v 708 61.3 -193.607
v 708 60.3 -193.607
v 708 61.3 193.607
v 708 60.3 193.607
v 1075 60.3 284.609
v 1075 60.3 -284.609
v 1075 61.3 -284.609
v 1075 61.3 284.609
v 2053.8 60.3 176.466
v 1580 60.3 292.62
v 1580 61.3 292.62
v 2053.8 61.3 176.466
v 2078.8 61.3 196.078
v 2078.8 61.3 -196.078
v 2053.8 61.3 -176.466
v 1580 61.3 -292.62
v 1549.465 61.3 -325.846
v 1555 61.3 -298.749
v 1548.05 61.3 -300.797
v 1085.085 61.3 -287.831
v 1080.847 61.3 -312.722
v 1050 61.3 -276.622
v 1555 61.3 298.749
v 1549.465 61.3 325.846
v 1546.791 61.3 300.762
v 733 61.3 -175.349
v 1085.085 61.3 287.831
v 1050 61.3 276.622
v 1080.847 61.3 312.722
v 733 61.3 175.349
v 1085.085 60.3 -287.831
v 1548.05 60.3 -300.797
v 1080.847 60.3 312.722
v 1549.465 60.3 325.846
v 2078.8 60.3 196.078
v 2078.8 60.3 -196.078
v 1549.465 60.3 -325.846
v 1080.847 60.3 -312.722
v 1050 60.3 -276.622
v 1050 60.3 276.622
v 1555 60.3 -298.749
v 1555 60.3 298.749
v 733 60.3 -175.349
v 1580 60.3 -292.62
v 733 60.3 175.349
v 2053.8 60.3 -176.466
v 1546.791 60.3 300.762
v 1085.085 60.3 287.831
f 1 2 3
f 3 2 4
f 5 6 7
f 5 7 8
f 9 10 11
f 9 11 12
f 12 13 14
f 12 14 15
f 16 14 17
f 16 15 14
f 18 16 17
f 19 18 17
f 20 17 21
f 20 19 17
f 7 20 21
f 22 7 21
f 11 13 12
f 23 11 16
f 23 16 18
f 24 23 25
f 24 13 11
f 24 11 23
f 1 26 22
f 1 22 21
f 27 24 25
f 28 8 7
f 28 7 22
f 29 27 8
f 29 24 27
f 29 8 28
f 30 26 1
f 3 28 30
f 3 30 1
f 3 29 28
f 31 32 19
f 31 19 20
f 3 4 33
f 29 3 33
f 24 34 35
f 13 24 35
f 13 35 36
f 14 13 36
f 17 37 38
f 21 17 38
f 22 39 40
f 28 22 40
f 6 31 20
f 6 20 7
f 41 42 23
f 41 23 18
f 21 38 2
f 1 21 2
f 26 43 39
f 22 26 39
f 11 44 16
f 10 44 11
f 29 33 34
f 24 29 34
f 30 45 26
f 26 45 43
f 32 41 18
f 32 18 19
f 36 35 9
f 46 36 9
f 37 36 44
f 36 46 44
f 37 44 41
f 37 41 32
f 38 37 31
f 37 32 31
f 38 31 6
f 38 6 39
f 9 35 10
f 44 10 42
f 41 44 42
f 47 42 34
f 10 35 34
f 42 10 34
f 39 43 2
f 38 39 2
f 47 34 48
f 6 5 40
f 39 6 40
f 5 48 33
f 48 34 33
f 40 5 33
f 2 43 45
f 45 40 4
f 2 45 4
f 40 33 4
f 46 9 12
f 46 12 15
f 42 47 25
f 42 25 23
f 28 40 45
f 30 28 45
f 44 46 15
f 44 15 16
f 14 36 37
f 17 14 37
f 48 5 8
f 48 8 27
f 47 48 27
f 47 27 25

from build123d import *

# Parameters (mm, degrees)
BOSS_EXTRUDE1_DEPTH = 1


with BuildPart() as part:
    # Sketch1 → Boss-Extrude1 (new body)
    with BuildSketch(Plane(origin=(0, 60.3, 0), x_dir=(-1, 0, 0), z_dir=(0, 1, 0))):
        Polygon((-1549.465155864, 325.846398989), (-2078.8, 196.077711894), (-2078.8, -196.077711894), (-1549.465155864, -325.846398989), (-1080.847435472, -312.721773603), (-708, -193.60723205), (-708, 193.60723205), (-1080.847435472, 312.721773603), align=None)
        Polygon((-1580, 292.620355358), (-2053.8, 176.466271366), (-2053.8, -176.466271366), (-1580, -292.620355358), align=None, mode=Mode.SUBTRACT)
        Polygon((-1546.790935185, 300.76169876), (-1555, 298.749211626), (-1555, -298.749211626), (-1548.049652364, -300.796951783), (-1085.08461283, -287.83064162), (-1075, -284.608884087), (-1075, 284.608884087), (-1085.08461283, 287.83064162), align=None, mode=Mode.SUBTRACT)
        Polygon((-733, 175.349253107), (-733, -175.349253107), (-1050, -276.622068957), (-1050, 276.622068957), align=None, mode=Mode.SUBTRACT)
    extrude(amount=BOSS_EXTRUDE1_DEPTH)


solid = part.part
